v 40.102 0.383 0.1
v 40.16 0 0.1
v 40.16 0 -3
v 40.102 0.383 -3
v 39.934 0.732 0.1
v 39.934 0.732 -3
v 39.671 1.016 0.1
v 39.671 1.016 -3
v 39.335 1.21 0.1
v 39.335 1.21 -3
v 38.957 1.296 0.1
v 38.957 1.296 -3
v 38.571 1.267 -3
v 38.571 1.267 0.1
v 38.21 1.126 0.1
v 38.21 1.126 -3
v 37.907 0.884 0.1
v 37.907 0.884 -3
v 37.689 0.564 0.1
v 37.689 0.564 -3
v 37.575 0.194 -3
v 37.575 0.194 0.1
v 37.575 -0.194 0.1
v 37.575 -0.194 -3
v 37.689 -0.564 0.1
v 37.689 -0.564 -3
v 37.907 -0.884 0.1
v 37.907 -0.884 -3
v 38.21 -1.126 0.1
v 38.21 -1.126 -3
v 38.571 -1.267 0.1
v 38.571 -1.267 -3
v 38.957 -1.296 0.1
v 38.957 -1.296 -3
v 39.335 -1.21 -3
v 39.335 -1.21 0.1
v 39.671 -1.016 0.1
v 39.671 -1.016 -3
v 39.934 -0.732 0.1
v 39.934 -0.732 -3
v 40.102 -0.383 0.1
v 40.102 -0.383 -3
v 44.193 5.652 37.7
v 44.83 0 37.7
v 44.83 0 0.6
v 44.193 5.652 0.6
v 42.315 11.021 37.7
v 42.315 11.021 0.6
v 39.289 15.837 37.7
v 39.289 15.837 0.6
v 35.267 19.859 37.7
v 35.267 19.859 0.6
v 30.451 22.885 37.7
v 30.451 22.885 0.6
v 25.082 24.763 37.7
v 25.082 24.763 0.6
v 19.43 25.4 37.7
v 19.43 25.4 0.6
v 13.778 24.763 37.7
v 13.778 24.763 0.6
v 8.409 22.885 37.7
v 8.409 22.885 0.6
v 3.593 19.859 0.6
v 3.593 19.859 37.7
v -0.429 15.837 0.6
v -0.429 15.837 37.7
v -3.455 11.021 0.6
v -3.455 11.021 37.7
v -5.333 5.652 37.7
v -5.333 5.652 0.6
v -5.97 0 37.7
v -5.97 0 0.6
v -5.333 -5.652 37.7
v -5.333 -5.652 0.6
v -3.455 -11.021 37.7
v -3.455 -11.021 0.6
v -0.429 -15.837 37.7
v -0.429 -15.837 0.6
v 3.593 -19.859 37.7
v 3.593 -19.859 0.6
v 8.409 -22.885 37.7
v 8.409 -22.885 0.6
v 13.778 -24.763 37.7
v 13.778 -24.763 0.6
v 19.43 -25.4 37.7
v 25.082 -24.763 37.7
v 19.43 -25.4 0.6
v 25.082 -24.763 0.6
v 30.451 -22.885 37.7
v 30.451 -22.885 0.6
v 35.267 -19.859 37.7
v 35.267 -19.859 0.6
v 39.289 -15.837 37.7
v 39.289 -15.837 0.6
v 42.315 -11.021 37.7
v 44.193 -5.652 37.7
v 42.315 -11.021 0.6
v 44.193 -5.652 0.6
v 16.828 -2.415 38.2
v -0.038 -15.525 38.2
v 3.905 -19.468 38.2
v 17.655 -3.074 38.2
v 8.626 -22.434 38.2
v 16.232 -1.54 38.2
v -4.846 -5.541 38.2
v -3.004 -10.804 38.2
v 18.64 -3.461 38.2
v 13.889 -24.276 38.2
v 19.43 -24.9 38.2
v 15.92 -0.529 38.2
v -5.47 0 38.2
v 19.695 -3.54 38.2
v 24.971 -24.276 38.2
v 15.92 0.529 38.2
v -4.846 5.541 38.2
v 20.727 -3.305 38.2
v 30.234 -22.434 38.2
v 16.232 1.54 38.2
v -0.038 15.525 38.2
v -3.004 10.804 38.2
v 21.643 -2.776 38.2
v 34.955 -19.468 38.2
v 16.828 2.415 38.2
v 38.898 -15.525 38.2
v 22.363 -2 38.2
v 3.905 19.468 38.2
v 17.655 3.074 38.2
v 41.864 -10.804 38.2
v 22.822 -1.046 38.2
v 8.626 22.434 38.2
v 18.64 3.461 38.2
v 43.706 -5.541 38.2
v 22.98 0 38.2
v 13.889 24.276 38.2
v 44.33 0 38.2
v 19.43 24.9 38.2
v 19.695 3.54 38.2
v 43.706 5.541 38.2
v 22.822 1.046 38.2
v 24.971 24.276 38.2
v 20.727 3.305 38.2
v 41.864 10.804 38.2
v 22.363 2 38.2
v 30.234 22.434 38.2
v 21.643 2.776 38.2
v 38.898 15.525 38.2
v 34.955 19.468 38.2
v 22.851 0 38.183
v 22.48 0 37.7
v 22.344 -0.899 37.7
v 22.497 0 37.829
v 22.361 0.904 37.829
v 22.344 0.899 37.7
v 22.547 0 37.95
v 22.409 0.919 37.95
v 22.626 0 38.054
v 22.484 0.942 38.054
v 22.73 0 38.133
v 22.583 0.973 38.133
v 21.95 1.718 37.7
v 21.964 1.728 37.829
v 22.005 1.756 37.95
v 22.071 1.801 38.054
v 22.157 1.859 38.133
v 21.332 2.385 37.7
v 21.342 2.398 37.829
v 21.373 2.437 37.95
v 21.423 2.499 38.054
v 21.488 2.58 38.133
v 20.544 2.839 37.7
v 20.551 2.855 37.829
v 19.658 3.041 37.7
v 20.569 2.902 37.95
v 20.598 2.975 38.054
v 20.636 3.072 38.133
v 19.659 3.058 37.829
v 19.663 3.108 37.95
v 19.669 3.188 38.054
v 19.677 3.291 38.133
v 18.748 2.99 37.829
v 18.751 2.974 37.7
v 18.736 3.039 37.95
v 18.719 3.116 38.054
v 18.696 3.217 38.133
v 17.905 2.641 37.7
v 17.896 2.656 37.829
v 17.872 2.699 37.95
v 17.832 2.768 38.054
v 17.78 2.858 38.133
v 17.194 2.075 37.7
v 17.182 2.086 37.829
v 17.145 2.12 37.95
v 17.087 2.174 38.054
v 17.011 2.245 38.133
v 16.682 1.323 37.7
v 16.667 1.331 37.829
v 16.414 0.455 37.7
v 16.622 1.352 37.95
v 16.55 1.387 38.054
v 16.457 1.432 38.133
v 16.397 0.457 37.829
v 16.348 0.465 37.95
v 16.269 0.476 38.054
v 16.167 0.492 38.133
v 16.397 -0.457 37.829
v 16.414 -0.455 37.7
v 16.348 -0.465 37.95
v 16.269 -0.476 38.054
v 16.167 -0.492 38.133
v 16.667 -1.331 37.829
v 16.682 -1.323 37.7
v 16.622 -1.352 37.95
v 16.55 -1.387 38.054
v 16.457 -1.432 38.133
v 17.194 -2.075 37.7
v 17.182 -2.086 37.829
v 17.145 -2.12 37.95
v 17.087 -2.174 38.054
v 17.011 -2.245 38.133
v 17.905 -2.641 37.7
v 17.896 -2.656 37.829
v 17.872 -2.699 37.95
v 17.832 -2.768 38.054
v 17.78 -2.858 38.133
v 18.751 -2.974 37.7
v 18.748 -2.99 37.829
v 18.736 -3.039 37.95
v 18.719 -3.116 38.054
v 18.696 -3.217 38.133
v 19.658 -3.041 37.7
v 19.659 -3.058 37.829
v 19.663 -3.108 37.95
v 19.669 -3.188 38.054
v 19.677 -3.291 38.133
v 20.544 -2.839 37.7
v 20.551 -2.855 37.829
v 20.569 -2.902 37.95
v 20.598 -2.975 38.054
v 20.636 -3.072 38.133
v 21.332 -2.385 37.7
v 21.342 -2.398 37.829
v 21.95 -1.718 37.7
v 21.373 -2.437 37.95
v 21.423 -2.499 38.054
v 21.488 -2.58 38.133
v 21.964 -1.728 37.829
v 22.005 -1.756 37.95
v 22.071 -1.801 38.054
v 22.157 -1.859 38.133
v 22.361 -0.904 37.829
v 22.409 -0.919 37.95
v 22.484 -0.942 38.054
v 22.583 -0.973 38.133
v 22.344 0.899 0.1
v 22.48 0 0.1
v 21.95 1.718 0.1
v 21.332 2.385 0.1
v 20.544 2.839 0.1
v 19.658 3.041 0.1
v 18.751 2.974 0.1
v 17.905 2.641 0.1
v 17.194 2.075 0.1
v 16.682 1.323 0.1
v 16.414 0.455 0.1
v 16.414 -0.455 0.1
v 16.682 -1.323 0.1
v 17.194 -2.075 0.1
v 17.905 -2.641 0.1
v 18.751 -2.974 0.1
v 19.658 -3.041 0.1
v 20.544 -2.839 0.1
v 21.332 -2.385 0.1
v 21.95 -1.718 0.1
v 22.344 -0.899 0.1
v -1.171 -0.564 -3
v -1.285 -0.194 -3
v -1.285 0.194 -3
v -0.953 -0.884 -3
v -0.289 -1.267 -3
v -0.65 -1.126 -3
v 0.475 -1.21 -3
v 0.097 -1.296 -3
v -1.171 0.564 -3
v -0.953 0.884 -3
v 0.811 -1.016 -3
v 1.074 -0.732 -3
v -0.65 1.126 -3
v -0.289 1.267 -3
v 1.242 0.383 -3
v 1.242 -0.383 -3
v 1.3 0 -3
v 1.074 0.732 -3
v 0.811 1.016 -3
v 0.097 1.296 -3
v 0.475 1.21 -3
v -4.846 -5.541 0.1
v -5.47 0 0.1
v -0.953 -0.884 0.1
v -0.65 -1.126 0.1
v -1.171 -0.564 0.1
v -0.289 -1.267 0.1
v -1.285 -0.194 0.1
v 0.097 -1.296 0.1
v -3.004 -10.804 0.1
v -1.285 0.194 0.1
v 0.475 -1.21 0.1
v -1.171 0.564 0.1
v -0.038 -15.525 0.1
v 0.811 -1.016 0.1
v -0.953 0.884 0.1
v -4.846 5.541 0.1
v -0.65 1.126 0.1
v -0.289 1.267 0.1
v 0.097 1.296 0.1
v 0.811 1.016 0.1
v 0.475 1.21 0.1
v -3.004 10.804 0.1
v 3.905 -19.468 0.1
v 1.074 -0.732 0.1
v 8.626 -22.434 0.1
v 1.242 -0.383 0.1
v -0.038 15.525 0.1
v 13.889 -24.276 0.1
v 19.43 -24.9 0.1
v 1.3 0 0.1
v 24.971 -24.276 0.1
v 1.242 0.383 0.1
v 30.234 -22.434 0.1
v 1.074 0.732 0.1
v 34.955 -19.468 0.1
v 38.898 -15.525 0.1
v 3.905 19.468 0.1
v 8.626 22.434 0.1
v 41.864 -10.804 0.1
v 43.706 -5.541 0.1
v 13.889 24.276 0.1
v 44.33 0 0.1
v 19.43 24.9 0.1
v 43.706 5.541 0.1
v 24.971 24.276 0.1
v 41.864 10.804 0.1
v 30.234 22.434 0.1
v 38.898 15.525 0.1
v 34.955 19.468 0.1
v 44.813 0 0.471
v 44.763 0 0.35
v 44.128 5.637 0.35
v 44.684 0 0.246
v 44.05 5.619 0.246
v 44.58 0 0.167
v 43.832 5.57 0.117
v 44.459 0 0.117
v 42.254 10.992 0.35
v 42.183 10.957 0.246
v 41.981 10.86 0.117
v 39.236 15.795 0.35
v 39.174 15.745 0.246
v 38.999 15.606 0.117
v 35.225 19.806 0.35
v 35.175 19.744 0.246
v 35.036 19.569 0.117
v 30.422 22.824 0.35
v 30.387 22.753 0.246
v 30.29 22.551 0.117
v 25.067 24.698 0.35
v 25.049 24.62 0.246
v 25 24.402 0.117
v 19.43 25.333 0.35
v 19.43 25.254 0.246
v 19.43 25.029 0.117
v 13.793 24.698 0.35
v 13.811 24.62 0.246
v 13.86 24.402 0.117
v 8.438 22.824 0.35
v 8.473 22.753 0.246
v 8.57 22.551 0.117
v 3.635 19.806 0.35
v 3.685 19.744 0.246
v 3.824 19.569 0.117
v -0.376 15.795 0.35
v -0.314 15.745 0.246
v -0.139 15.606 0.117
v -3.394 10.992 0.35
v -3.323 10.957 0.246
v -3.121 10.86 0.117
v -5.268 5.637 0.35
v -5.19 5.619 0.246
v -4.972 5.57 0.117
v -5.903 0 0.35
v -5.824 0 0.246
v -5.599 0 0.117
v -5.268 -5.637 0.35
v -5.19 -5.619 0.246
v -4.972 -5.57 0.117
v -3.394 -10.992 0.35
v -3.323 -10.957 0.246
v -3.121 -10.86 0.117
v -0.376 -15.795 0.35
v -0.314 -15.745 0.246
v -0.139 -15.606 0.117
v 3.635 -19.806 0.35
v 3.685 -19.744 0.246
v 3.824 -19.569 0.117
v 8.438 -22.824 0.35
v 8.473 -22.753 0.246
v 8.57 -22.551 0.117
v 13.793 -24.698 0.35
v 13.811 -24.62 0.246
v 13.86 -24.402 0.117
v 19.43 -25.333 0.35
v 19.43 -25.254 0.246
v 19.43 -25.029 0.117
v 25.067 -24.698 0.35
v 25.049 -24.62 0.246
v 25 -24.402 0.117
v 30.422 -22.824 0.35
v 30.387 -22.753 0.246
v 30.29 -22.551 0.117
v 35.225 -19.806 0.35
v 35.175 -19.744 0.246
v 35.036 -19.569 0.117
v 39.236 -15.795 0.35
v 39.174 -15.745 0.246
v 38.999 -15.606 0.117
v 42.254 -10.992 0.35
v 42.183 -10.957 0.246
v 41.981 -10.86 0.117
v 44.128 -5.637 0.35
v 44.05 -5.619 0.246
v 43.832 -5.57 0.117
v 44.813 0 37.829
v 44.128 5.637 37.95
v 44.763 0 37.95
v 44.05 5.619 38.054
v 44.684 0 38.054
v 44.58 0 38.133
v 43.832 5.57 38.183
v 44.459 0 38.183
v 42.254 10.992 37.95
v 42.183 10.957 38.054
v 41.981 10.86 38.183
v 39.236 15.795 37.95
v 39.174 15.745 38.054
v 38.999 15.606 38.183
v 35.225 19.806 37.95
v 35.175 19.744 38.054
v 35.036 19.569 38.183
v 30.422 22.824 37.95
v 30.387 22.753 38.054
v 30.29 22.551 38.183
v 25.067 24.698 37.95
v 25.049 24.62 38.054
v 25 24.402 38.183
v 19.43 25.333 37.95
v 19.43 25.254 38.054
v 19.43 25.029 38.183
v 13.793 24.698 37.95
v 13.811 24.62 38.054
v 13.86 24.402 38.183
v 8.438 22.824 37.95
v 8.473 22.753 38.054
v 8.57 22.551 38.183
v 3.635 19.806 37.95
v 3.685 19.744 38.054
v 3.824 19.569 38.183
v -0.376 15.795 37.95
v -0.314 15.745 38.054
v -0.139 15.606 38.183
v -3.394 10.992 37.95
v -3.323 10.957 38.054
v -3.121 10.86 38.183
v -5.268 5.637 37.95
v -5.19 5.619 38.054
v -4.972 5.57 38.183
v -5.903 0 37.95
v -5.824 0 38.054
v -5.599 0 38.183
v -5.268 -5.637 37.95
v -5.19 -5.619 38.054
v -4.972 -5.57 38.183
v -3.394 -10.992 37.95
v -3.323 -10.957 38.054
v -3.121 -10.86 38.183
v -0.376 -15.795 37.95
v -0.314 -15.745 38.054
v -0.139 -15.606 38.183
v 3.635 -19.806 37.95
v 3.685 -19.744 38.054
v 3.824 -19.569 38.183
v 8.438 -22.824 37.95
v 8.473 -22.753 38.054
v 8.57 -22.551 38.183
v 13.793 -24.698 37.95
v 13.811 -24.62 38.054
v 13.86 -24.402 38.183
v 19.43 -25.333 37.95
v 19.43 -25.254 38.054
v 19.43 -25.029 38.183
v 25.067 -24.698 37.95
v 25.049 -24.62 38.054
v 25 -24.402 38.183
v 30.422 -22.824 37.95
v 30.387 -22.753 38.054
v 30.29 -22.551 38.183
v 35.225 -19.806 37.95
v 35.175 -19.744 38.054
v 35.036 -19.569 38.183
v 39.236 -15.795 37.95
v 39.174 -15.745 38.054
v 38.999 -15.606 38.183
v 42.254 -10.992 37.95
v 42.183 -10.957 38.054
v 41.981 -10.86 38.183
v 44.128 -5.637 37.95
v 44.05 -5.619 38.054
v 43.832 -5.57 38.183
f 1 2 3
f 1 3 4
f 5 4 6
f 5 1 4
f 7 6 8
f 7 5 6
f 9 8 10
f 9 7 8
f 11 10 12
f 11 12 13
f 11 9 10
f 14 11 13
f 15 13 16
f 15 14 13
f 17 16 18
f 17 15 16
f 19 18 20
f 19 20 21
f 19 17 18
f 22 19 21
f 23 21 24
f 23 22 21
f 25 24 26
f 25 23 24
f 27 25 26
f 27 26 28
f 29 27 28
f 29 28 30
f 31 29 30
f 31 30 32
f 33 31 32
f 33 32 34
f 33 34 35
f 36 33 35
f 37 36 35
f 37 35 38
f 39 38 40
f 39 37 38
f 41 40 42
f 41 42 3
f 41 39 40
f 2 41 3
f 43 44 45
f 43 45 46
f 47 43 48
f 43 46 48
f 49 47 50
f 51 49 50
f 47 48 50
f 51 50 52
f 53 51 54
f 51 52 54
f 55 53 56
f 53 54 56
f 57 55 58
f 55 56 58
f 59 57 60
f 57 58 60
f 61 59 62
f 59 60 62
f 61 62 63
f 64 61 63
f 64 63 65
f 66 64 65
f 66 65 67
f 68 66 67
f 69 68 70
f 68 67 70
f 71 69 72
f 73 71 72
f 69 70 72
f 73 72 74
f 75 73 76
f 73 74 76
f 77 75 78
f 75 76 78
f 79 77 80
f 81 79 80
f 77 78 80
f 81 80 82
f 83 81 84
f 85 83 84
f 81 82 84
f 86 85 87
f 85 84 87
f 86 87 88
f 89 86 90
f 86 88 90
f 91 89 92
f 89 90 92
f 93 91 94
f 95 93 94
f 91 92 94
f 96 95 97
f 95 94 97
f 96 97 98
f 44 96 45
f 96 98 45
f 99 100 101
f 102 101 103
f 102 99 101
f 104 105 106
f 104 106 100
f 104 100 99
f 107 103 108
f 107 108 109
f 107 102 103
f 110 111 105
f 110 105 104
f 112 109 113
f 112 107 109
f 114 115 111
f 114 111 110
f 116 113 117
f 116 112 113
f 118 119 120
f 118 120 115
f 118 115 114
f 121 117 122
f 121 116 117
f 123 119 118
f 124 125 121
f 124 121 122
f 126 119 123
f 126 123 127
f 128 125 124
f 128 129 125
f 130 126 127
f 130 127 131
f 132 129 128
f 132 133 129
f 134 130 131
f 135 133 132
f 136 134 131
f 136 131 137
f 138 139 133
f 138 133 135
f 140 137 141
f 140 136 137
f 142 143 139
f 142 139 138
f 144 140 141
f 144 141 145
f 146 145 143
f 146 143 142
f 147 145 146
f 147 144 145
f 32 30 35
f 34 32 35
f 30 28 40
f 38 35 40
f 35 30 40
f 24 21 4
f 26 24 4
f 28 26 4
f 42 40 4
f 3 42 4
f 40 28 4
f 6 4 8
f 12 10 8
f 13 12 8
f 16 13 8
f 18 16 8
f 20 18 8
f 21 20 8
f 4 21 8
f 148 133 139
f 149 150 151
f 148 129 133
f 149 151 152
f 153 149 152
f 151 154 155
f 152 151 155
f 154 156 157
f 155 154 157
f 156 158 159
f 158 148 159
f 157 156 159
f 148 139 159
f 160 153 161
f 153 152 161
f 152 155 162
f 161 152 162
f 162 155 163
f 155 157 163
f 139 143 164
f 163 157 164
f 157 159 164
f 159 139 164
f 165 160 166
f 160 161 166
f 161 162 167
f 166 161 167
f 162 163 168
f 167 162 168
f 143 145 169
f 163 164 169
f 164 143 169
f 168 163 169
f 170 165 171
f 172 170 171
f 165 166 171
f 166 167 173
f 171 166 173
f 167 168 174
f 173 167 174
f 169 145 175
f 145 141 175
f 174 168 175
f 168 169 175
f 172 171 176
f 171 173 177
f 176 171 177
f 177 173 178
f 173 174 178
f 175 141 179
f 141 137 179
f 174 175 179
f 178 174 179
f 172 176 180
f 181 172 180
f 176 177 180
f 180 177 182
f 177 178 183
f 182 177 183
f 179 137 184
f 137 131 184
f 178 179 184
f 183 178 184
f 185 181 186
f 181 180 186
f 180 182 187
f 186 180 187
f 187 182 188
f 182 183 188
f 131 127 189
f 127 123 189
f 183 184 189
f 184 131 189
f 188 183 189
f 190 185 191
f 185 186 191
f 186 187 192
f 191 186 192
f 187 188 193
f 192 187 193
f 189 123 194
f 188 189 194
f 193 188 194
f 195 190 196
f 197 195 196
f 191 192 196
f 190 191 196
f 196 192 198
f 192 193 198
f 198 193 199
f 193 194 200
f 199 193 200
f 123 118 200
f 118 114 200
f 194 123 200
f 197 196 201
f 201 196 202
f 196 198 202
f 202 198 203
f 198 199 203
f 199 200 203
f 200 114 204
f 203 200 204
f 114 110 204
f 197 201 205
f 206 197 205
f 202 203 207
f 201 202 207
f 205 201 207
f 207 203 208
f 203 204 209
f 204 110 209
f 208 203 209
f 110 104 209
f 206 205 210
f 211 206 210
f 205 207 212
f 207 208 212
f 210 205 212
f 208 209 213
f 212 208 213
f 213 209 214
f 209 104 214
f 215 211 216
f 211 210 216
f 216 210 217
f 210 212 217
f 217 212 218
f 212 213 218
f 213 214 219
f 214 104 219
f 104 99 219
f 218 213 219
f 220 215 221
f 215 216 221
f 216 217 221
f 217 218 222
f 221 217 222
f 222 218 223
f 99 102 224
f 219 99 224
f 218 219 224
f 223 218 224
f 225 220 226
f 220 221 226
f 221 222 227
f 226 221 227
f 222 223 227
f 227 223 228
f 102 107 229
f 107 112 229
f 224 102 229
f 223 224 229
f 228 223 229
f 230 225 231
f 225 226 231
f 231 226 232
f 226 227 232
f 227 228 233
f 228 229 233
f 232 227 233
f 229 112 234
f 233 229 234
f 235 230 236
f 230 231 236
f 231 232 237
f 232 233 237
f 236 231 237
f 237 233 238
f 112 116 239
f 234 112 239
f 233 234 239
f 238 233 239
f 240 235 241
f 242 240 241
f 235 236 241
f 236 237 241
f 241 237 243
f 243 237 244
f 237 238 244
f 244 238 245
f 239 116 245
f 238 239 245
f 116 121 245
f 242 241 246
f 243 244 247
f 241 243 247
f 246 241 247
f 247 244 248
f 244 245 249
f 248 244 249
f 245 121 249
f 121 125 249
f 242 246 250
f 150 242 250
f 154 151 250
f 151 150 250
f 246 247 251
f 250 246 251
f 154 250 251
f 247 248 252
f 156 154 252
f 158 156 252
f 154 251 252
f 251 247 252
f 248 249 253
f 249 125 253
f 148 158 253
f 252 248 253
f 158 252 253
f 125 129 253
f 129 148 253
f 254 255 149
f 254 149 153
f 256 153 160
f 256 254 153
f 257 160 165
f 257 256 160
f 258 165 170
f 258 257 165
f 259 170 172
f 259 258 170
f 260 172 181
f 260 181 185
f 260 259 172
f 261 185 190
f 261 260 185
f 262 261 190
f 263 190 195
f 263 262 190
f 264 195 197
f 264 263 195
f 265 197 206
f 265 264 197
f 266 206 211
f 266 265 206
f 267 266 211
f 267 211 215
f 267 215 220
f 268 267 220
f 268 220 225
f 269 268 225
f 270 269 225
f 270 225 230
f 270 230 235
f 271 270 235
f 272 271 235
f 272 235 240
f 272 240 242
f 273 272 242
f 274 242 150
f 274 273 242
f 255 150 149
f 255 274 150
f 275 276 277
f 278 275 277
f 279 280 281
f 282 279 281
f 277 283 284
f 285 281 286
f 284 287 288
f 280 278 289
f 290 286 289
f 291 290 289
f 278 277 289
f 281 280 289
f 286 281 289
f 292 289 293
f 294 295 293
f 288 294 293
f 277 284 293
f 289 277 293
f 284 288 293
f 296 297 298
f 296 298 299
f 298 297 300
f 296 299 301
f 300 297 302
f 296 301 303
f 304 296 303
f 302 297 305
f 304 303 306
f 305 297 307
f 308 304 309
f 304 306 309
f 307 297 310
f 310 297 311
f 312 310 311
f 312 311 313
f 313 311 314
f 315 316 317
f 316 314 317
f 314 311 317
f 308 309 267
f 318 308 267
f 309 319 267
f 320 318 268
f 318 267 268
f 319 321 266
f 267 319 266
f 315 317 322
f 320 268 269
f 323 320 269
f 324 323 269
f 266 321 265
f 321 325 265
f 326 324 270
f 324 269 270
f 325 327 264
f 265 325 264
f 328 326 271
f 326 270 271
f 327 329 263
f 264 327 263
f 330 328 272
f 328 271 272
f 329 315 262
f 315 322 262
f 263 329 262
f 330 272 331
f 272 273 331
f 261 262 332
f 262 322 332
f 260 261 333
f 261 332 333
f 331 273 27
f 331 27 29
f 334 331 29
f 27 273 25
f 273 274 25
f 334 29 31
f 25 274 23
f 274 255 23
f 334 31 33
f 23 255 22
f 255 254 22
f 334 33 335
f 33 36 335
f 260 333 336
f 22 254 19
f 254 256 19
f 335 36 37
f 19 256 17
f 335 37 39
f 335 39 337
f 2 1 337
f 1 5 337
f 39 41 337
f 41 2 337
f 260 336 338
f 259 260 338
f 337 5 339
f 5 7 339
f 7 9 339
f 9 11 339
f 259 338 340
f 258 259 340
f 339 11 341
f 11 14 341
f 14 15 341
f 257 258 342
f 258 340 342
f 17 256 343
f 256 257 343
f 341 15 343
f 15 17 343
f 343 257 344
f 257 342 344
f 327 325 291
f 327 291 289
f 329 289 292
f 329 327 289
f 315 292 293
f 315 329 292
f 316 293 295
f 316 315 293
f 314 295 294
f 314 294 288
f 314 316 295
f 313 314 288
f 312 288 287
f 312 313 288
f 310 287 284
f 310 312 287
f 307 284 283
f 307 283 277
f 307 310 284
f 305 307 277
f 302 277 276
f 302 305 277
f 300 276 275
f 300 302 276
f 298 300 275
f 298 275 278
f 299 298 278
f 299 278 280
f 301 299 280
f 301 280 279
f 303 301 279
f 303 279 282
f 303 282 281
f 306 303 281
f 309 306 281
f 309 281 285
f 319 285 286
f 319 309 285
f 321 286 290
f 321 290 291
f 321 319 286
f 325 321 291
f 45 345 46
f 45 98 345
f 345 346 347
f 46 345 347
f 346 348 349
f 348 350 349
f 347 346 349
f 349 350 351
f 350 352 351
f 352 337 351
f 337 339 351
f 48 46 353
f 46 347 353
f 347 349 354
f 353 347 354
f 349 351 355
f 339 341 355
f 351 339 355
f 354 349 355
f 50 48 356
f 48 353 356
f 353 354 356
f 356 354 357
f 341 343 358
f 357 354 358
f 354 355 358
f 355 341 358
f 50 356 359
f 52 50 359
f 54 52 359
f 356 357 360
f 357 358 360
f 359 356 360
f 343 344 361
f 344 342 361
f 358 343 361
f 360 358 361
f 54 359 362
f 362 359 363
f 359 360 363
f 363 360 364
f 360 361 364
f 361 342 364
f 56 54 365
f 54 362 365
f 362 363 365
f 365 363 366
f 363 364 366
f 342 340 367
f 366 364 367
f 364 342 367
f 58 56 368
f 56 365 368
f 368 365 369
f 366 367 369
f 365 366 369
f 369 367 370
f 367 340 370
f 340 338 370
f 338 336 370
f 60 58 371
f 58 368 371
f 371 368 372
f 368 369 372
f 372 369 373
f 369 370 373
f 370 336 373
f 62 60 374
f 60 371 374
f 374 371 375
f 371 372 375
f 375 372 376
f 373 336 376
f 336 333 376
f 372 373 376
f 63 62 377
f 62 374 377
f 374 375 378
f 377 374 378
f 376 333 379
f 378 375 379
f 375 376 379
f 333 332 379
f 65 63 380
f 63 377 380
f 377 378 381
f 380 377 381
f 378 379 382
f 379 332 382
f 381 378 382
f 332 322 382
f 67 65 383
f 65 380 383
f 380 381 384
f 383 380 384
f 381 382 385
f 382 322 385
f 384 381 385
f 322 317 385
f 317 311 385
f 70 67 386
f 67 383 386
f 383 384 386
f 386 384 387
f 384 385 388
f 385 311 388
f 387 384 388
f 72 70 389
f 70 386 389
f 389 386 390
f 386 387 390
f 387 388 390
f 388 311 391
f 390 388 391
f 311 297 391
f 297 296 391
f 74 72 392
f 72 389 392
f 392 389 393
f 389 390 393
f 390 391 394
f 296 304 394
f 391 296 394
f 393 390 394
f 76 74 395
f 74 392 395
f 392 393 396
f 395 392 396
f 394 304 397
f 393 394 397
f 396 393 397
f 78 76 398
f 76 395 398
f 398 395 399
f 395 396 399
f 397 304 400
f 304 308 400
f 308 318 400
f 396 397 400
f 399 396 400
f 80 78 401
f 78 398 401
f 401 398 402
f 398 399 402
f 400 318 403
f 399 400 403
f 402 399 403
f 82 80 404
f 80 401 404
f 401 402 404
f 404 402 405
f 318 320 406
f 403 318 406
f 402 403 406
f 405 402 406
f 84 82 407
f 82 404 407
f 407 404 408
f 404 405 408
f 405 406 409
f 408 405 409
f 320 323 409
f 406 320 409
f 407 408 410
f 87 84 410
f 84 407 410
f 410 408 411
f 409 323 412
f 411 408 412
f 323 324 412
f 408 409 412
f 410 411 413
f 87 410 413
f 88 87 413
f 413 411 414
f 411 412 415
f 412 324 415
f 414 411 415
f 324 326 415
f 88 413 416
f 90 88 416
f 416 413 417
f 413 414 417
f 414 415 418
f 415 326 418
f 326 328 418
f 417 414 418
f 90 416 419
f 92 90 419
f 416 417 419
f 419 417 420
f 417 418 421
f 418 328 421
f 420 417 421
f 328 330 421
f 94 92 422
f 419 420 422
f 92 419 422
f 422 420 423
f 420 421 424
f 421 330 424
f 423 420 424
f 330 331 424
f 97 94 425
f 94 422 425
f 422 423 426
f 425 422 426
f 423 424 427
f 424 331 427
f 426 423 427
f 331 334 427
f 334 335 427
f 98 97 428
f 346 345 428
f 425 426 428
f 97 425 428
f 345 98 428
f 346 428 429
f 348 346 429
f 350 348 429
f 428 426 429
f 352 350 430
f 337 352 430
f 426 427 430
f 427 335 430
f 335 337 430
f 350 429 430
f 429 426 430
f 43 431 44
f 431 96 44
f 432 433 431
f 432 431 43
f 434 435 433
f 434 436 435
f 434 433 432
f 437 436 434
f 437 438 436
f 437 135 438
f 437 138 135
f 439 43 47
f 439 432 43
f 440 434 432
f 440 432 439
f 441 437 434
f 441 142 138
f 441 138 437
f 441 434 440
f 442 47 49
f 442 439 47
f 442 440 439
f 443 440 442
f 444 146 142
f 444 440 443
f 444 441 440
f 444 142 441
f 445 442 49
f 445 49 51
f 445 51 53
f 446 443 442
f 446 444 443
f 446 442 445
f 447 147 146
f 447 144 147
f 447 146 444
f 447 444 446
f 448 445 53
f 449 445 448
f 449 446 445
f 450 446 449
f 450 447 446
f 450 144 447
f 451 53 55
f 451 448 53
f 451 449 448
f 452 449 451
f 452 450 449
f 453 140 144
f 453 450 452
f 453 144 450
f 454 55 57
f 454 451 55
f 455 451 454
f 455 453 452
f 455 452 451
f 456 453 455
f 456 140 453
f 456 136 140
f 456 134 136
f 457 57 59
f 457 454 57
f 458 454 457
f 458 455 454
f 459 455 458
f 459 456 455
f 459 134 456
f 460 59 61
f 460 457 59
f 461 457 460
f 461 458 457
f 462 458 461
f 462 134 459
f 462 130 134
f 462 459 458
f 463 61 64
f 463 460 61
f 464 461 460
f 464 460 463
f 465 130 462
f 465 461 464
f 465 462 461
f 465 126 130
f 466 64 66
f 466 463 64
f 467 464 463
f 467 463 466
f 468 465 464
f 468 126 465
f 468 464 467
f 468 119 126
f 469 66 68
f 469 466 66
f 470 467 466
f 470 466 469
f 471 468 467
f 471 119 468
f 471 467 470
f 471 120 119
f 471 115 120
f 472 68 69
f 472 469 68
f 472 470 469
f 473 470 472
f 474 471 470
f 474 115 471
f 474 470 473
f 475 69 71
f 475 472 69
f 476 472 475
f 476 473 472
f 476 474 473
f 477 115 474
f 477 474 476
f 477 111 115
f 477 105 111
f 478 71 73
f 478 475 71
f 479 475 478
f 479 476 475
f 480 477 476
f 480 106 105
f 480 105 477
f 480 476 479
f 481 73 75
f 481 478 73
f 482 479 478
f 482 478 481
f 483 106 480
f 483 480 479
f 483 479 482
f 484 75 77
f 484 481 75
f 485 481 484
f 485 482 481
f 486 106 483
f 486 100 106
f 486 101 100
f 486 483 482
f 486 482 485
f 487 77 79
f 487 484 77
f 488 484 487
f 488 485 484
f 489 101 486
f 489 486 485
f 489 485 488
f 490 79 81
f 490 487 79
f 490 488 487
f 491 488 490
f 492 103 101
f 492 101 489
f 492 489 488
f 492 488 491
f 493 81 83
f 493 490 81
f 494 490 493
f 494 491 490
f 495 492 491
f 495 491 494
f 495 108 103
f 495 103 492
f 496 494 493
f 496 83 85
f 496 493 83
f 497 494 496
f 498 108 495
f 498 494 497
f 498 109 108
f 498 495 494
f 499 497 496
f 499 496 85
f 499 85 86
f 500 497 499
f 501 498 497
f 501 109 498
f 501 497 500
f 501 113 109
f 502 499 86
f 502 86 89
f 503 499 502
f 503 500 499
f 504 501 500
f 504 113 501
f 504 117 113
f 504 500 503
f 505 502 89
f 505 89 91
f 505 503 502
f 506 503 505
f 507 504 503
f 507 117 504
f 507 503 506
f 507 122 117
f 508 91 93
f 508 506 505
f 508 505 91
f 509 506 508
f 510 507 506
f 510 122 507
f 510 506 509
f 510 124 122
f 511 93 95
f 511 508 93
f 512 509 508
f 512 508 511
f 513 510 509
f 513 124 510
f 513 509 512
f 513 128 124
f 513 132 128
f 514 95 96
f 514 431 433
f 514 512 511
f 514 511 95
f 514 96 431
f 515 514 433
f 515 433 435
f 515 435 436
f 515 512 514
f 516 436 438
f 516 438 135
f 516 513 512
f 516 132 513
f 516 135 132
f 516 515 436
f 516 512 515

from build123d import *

# Parameters (mm, degrees)
SKETCH_R          = 25.4
SKETCH_R_2        = 3.05
PAD_DEPTH         = 38.1
FILLET_R          = 0.5
SKETCH001_R       = 1.3
PAD001_DEPTH      = 19.05
PAD001_DEPTH_BACK = 3.5


with BuildPart() as fillet_body:
    # Sketch → Pad (new body)
    with BuildSketch(Plane.XY.offset(0.1)):
        with Locations((19.43, 0)):
            Circle(SKETCH_R)
        with Locations((19.43, 0)):
            Circle(SKETCH_R_2, mode=Mode.SUBTRACT)
    extrude(amount=PAD_DEPTH)

    # Fillet
    fillet_edges = [fillet_body.edges().sort_by_distance(p)[0] for p in [
        (16.38, 0, 38.2),
        (-5.97, 0, 38.2),
        (-5.97, 0, 0.1),
    ]]
    fillet(fillet_edges, radius=FILLET_R)


with BuildPart() as pad001_mp_cp:
    # Sketch001 → Pad001 (new body, two sides)
    with BuildSketch(Plane.XY.offset(0.5)) as pad001_sk:
        Circle(SKETCH001_R)
        with Locations((38.86, 0)):
            Circle(SKETCH001_R)
    extrude(amount=PAD001_DEPTH)
    extrude(pad001_sk.sketch, amount=-PAD001_DEPTH_BACK)

    # Pad001_mp_cp: union Fillet body
    add(fillet_body.part)


solid = pad001_mp_cp.part
